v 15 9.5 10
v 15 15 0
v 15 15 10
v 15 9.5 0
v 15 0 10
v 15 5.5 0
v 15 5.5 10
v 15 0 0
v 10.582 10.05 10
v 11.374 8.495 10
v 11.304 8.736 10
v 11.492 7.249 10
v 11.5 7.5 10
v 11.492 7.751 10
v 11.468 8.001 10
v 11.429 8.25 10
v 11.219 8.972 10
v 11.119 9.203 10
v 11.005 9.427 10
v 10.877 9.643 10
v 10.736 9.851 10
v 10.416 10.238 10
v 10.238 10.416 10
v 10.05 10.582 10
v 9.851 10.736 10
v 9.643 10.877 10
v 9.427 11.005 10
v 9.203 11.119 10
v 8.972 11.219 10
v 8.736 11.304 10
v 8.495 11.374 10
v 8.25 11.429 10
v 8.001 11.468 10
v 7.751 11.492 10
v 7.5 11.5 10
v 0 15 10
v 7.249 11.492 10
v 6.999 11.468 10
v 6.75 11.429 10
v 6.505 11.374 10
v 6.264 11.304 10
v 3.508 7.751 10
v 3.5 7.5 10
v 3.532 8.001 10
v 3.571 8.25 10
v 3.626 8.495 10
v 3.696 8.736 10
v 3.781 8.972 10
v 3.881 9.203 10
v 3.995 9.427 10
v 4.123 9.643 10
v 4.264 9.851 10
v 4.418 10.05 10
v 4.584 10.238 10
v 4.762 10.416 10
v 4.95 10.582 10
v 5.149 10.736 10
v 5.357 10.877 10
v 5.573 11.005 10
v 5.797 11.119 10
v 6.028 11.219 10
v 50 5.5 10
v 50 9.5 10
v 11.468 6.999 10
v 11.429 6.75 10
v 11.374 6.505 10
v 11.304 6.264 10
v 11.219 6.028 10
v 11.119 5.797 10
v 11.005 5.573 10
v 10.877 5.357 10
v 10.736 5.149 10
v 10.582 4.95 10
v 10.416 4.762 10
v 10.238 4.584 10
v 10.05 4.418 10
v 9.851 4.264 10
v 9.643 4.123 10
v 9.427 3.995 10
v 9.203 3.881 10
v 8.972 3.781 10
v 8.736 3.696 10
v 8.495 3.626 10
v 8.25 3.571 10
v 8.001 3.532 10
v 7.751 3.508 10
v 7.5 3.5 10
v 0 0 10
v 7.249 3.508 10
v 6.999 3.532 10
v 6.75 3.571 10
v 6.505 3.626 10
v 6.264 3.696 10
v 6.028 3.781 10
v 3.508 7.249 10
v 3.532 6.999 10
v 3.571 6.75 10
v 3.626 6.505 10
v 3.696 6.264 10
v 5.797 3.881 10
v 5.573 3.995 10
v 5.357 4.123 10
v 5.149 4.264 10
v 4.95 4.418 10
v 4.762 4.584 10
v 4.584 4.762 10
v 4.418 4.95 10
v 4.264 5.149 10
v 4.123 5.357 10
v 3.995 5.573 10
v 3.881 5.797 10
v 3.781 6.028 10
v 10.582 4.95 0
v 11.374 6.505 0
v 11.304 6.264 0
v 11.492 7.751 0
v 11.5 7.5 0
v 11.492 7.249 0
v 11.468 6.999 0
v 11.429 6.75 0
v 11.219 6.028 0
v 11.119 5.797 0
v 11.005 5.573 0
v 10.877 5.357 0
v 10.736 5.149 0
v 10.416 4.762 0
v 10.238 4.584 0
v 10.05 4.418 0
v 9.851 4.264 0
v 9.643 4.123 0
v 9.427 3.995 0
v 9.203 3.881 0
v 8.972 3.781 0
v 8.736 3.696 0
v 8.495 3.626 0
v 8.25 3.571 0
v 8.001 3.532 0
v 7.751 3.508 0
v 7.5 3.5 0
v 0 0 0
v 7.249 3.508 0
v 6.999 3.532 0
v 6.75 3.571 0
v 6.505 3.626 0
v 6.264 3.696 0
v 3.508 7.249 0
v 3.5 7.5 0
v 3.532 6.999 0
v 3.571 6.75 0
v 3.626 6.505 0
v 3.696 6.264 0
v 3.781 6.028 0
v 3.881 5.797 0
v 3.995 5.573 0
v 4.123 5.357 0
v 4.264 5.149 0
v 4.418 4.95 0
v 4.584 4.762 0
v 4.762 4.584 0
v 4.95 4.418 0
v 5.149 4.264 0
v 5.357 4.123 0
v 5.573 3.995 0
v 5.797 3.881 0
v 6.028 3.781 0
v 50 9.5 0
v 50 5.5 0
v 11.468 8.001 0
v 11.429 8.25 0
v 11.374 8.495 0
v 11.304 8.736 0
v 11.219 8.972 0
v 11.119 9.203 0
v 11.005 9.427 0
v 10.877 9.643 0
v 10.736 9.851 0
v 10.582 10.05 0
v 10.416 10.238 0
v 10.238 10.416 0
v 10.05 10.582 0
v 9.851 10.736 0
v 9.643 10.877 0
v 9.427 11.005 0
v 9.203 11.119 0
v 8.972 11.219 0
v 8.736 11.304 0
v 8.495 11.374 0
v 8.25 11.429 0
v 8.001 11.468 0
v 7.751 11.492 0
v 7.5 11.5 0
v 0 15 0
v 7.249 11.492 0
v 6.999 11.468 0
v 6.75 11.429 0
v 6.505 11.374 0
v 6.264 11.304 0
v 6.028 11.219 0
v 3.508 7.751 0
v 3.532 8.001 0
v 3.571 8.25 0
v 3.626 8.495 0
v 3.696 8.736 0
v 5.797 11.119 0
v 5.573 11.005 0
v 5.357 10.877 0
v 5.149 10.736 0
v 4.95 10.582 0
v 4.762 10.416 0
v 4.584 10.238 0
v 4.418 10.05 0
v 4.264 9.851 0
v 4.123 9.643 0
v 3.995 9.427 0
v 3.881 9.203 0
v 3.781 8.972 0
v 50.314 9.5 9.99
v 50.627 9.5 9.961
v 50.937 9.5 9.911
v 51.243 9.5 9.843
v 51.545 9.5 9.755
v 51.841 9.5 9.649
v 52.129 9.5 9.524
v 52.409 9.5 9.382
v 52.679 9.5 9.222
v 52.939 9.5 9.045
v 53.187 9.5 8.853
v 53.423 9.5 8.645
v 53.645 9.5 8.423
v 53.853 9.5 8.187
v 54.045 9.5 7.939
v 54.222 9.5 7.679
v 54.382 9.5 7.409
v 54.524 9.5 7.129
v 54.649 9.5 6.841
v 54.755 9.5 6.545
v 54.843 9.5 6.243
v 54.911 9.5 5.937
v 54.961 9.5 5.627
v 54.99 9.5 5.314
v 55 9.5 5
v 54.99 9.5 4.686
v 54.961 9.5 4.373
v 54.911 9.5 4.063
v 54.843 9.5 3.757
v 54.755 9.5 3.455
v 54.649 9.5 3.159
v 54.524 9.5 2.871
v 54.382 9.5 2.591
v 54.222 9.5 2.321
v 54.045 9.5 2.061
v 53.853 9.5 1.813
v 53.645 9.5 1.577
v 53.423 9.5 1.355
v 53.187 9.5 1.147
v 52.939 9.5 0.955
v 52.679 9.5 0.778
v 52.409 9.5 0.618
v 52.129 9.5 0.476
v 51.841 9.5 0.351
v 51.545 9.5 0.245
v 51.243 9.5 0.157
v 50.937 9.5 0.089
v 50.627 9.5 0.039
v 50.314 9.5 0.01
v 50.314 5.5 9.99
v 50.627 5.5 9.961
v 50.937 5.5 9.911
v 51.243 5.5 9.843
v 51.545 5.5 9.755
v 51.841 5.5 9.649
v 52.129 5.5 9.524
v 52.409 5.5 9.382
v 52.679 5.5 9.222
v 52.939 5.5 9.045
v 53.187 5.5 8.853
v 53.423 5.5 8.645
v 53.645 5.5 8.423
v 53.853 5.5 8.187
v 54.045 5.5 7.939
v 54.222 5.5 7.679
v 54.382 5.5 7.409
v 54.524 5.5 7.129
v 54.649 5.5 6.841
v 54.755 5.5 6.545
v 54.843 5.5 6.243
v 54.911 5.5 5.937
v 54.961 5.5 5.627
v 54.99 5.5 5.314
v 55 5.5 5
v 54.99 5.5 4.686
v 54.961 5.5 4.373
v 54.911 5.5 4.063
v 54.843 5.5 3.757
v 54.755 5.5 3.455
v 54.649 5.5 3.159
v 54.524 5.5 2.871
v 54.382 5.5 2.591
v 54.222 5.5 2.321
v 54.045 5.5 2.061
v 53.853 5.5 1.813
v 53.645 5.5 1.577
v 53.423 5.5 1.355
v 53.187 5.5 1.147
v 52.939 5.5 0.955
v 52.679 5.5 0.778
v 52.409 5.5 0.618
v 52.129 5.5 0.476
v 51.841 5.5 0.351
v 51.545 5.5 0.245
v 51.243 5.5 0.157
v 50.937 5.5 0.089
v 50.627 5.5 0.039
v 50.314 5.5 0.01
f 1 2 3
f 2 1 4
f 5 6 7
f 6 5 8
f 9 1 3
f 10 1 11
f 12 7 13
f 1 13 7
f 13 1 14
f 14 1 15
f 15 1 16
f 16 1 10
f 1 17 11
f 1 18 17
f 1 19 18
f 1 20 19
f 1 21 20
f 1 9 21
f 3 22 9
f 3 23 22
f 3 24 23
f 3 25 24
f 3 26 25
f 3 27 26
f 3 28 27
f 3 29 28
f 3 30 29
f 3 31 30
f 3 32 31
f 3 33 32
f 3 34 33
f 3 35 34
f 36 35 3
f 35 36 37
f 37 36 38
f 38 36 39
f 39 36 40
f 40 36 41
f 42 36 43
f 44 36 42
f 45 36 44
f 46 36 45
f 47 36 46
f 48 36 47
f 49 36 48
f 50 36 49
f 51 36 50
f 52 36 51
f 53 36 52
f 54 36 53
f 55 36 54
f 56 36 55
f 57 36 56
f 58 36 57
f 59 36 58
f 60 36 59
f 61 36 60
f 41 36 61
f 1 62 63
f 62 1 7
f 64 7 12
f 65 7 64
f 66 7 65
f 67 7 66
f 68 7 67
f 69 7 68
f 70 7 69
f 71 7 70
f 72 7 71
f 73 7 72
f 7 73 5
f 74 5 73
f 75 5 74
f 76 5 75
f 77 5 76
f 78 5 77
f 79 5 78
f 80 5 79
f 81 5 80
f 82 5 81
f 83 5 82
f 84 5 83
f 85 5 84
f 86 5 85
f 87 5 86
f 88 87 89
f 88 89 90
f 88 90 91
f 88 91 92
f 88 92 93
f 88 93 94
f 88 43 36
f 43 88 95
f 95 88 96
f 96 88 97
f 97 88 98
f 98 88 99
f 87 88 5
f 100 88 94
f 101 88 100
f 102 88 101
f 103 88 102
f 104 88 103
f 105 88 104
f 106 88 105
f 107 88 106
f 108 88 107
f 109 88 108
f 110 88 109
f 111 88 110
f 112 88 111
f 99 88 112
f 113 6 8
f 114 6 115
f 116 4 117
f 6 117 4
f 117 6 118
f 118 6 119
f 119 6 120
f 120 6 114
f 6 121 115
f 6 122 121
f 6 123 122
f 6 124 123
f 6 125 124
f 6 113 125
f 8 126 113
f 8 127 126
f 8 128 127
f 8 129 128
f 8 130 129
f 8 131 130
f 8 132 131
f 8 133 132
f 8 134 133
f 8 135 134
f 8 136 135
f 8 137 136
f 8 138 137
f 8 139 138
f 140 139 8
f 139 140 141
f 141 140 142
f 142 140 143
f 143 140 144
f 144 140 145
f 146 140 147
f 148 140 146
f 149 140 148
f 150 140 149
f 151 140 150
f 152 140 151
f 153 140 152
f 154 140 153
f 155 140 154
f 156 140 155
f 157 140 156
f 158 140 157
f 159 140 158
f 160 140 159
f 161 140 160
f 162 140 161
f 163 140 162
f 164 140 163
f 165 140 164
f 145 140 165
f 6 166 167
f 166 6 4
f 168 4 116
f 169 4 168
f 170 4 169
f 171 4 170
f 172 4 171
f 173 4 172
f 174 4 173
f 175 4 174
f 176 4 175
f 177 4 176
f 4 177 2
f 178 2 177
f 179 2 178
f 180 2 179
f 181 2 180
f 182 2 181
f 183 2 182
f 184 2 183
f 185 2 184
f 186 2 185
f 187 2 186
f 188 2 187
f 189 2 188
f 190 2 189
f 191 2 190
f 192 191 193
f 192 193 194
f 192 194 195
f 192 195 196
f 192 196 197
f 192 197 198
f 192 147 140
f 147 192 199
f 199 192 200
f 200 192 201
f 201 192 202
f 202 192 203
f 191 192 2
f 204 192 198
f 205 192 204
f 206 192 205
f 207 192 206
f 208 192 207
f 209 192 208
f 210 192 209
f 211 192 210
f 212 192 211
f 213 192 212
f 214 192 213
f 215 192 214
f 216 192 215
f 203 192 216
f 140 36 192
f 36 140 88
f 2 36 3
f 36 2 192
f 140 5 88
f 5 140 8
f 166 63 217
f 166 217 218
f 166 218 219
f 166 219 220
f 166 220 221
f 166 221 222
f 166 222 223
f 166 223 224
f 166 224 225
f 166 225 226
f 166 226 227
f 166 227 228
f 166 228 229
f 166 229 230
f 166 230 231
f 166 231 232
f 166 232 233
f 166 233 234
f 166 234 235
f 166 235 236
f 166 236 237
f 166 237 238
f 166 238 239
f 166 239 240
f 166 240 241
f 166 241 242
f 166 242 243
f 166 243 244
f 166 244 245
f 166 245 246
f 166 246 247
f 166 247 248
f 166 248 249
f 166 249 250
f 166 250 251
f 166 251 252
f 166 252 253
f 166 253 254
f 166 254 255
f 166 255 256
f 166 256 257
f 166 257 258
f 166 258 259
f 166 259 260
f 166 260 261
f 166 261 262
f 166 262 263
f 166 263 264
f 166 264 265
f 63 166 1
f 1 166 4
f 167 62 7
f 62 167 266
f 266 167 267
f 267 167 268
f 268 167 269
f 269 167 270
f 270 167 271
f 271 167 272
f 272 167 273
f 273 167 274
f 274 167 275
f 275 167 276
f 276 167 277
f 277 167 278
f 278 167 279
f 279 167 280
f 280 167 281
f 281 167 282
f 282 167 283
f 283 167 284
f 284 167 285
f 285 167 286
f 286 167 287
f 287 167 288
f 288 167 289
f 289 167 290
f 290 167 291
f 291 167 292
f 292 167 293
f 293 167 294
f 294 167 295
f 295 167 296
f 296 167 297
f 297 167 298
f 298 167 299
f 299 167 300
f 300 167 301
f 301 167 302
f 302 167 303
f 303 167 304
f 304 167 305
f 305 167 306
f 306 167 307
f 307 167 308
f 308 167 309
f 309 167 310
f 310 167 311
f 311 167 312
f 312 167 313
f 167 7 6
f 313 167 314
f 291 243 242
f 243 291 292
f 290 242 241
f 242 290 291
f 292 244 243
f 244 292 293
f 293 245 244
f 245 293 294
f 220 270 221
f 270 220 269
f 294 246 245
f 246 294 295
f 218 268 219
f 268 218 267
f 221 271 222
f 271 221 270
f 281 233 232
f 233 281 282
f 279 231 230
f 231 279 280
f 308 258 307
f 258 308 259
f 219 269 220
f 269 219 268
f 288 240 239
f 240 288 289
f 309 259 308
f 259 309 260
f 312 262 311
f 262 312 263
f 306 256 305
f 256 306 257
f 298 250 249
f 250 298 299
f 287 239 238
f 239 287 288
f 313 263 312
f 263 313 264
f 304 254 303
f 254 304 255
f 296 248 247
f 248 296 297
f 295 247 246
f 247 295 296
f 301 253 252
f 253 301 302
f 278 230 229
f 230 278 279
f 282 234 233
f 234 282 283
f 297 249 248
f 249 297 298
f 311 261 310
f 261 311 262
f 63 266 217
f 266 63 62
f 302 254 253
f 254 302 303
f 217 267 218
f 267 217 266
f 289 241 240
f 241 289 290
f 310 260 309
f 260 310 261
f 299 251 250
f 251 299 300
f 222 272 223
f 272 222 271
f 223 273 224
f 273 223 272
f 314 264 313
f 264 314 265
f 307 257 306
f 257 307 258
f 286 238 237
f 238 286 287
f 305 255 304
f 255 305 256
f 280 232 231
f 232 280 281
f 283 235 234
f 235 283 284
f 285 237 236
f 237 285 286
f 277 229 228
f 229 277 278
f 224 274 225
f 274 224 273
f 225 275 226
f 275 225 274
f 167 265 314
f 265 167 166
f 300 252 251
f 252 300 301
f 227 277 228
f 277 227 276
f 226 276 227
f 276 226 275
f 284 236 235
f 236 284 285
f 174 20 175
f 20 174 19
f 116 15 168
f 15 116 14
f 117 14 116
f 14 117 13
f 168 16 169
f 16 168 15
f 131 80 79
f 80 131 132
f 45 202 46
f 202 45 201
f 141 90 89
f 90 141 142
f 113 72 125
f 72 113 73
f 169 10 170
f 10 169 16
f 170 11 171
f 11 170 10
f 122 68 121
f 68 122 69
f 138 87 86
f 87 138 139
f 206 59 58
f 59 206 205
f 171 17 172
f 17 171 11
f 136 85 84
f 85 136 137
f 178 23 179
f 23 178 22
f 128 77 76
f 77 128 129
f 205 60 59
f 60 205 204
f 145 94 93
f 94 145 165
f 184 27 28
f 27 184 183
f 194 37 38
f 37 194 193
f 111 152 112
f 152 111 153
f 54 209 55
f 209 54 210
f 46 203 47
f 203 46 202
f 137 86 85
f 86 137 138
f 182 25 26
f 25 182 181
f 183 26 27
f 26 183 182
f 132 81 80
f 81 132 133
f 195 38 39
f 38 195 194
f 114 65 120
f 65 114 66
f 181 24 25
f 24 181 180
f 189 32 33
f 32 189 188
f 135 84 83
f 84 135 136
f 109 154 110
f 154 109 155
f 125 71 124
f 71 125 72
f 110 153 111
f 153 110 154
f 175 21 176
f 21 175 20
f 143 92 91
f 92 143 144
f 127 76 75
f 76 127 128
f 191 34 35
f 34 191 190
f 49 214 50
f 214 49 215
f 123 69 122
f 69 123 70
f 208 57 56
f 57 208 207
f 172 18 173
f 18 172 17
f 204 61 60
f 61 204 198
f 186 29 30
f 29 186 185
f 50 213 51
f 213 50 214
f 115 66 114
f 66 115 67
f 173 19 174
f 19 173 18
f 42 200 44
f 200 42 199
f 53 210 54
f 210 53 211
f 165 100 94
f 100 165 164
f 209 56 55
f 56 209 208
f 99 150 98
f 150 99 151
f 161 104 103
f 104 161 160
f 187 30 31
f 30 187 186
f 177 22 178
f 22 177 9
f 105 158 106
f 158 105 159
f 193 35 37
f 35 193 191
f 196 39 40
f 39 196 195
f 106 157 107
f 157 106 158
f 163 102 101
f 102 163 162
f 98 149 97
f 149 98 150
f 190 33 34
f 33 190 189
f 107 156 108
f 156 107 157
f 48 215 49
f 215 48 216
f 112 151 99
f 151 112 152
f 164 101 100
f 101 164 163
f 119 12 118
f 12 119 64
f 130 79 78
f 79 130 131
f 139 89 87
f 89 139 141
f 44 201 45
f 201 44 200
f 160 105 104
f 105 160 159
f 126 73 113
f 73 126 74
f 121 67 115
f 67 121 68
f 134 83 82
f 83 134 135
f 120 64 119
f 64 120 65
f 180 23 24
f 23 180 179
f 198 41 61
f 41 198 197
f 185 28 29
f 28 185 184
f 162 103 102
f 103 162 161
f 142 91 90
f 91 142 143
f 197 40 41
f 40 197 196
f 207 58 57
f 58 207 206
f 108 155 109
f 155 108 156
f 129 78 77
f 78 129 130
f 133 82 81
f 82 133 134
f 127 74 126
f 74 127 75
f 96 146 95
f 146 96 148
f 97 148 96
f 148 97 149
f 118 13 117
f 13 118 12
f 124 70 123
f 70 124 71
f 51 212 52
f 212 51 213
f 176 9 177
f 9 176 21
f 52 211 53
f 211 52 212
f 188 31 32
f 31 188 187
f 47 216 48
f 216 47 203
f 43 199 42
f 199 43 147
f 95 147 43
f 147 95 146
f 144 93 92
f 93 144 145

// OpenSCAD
r_m8=4;
larg=15;
hauteur=10;
longueur=50;
ep=4;

module sup_bobine(){
	difference(){
		union(){
			cube([larg,larg,hauteur]);
			translate([larg,larg/2-ep/2,0]){cube([longueur-larg,ep,hauteur]);}
			translate([longueur,larg/2-ep/2,hauteur/2]){rotate([-90,0,0])cylinder(h = ep, r = hauteur/2, $fn=100);}
		}
		
		//trou M8
		translate([larg/2,larg/2,-5]){cylinder(h = hauteur+10, r = r_m8, $fn=100);}
	}
}

sup_bobine();
